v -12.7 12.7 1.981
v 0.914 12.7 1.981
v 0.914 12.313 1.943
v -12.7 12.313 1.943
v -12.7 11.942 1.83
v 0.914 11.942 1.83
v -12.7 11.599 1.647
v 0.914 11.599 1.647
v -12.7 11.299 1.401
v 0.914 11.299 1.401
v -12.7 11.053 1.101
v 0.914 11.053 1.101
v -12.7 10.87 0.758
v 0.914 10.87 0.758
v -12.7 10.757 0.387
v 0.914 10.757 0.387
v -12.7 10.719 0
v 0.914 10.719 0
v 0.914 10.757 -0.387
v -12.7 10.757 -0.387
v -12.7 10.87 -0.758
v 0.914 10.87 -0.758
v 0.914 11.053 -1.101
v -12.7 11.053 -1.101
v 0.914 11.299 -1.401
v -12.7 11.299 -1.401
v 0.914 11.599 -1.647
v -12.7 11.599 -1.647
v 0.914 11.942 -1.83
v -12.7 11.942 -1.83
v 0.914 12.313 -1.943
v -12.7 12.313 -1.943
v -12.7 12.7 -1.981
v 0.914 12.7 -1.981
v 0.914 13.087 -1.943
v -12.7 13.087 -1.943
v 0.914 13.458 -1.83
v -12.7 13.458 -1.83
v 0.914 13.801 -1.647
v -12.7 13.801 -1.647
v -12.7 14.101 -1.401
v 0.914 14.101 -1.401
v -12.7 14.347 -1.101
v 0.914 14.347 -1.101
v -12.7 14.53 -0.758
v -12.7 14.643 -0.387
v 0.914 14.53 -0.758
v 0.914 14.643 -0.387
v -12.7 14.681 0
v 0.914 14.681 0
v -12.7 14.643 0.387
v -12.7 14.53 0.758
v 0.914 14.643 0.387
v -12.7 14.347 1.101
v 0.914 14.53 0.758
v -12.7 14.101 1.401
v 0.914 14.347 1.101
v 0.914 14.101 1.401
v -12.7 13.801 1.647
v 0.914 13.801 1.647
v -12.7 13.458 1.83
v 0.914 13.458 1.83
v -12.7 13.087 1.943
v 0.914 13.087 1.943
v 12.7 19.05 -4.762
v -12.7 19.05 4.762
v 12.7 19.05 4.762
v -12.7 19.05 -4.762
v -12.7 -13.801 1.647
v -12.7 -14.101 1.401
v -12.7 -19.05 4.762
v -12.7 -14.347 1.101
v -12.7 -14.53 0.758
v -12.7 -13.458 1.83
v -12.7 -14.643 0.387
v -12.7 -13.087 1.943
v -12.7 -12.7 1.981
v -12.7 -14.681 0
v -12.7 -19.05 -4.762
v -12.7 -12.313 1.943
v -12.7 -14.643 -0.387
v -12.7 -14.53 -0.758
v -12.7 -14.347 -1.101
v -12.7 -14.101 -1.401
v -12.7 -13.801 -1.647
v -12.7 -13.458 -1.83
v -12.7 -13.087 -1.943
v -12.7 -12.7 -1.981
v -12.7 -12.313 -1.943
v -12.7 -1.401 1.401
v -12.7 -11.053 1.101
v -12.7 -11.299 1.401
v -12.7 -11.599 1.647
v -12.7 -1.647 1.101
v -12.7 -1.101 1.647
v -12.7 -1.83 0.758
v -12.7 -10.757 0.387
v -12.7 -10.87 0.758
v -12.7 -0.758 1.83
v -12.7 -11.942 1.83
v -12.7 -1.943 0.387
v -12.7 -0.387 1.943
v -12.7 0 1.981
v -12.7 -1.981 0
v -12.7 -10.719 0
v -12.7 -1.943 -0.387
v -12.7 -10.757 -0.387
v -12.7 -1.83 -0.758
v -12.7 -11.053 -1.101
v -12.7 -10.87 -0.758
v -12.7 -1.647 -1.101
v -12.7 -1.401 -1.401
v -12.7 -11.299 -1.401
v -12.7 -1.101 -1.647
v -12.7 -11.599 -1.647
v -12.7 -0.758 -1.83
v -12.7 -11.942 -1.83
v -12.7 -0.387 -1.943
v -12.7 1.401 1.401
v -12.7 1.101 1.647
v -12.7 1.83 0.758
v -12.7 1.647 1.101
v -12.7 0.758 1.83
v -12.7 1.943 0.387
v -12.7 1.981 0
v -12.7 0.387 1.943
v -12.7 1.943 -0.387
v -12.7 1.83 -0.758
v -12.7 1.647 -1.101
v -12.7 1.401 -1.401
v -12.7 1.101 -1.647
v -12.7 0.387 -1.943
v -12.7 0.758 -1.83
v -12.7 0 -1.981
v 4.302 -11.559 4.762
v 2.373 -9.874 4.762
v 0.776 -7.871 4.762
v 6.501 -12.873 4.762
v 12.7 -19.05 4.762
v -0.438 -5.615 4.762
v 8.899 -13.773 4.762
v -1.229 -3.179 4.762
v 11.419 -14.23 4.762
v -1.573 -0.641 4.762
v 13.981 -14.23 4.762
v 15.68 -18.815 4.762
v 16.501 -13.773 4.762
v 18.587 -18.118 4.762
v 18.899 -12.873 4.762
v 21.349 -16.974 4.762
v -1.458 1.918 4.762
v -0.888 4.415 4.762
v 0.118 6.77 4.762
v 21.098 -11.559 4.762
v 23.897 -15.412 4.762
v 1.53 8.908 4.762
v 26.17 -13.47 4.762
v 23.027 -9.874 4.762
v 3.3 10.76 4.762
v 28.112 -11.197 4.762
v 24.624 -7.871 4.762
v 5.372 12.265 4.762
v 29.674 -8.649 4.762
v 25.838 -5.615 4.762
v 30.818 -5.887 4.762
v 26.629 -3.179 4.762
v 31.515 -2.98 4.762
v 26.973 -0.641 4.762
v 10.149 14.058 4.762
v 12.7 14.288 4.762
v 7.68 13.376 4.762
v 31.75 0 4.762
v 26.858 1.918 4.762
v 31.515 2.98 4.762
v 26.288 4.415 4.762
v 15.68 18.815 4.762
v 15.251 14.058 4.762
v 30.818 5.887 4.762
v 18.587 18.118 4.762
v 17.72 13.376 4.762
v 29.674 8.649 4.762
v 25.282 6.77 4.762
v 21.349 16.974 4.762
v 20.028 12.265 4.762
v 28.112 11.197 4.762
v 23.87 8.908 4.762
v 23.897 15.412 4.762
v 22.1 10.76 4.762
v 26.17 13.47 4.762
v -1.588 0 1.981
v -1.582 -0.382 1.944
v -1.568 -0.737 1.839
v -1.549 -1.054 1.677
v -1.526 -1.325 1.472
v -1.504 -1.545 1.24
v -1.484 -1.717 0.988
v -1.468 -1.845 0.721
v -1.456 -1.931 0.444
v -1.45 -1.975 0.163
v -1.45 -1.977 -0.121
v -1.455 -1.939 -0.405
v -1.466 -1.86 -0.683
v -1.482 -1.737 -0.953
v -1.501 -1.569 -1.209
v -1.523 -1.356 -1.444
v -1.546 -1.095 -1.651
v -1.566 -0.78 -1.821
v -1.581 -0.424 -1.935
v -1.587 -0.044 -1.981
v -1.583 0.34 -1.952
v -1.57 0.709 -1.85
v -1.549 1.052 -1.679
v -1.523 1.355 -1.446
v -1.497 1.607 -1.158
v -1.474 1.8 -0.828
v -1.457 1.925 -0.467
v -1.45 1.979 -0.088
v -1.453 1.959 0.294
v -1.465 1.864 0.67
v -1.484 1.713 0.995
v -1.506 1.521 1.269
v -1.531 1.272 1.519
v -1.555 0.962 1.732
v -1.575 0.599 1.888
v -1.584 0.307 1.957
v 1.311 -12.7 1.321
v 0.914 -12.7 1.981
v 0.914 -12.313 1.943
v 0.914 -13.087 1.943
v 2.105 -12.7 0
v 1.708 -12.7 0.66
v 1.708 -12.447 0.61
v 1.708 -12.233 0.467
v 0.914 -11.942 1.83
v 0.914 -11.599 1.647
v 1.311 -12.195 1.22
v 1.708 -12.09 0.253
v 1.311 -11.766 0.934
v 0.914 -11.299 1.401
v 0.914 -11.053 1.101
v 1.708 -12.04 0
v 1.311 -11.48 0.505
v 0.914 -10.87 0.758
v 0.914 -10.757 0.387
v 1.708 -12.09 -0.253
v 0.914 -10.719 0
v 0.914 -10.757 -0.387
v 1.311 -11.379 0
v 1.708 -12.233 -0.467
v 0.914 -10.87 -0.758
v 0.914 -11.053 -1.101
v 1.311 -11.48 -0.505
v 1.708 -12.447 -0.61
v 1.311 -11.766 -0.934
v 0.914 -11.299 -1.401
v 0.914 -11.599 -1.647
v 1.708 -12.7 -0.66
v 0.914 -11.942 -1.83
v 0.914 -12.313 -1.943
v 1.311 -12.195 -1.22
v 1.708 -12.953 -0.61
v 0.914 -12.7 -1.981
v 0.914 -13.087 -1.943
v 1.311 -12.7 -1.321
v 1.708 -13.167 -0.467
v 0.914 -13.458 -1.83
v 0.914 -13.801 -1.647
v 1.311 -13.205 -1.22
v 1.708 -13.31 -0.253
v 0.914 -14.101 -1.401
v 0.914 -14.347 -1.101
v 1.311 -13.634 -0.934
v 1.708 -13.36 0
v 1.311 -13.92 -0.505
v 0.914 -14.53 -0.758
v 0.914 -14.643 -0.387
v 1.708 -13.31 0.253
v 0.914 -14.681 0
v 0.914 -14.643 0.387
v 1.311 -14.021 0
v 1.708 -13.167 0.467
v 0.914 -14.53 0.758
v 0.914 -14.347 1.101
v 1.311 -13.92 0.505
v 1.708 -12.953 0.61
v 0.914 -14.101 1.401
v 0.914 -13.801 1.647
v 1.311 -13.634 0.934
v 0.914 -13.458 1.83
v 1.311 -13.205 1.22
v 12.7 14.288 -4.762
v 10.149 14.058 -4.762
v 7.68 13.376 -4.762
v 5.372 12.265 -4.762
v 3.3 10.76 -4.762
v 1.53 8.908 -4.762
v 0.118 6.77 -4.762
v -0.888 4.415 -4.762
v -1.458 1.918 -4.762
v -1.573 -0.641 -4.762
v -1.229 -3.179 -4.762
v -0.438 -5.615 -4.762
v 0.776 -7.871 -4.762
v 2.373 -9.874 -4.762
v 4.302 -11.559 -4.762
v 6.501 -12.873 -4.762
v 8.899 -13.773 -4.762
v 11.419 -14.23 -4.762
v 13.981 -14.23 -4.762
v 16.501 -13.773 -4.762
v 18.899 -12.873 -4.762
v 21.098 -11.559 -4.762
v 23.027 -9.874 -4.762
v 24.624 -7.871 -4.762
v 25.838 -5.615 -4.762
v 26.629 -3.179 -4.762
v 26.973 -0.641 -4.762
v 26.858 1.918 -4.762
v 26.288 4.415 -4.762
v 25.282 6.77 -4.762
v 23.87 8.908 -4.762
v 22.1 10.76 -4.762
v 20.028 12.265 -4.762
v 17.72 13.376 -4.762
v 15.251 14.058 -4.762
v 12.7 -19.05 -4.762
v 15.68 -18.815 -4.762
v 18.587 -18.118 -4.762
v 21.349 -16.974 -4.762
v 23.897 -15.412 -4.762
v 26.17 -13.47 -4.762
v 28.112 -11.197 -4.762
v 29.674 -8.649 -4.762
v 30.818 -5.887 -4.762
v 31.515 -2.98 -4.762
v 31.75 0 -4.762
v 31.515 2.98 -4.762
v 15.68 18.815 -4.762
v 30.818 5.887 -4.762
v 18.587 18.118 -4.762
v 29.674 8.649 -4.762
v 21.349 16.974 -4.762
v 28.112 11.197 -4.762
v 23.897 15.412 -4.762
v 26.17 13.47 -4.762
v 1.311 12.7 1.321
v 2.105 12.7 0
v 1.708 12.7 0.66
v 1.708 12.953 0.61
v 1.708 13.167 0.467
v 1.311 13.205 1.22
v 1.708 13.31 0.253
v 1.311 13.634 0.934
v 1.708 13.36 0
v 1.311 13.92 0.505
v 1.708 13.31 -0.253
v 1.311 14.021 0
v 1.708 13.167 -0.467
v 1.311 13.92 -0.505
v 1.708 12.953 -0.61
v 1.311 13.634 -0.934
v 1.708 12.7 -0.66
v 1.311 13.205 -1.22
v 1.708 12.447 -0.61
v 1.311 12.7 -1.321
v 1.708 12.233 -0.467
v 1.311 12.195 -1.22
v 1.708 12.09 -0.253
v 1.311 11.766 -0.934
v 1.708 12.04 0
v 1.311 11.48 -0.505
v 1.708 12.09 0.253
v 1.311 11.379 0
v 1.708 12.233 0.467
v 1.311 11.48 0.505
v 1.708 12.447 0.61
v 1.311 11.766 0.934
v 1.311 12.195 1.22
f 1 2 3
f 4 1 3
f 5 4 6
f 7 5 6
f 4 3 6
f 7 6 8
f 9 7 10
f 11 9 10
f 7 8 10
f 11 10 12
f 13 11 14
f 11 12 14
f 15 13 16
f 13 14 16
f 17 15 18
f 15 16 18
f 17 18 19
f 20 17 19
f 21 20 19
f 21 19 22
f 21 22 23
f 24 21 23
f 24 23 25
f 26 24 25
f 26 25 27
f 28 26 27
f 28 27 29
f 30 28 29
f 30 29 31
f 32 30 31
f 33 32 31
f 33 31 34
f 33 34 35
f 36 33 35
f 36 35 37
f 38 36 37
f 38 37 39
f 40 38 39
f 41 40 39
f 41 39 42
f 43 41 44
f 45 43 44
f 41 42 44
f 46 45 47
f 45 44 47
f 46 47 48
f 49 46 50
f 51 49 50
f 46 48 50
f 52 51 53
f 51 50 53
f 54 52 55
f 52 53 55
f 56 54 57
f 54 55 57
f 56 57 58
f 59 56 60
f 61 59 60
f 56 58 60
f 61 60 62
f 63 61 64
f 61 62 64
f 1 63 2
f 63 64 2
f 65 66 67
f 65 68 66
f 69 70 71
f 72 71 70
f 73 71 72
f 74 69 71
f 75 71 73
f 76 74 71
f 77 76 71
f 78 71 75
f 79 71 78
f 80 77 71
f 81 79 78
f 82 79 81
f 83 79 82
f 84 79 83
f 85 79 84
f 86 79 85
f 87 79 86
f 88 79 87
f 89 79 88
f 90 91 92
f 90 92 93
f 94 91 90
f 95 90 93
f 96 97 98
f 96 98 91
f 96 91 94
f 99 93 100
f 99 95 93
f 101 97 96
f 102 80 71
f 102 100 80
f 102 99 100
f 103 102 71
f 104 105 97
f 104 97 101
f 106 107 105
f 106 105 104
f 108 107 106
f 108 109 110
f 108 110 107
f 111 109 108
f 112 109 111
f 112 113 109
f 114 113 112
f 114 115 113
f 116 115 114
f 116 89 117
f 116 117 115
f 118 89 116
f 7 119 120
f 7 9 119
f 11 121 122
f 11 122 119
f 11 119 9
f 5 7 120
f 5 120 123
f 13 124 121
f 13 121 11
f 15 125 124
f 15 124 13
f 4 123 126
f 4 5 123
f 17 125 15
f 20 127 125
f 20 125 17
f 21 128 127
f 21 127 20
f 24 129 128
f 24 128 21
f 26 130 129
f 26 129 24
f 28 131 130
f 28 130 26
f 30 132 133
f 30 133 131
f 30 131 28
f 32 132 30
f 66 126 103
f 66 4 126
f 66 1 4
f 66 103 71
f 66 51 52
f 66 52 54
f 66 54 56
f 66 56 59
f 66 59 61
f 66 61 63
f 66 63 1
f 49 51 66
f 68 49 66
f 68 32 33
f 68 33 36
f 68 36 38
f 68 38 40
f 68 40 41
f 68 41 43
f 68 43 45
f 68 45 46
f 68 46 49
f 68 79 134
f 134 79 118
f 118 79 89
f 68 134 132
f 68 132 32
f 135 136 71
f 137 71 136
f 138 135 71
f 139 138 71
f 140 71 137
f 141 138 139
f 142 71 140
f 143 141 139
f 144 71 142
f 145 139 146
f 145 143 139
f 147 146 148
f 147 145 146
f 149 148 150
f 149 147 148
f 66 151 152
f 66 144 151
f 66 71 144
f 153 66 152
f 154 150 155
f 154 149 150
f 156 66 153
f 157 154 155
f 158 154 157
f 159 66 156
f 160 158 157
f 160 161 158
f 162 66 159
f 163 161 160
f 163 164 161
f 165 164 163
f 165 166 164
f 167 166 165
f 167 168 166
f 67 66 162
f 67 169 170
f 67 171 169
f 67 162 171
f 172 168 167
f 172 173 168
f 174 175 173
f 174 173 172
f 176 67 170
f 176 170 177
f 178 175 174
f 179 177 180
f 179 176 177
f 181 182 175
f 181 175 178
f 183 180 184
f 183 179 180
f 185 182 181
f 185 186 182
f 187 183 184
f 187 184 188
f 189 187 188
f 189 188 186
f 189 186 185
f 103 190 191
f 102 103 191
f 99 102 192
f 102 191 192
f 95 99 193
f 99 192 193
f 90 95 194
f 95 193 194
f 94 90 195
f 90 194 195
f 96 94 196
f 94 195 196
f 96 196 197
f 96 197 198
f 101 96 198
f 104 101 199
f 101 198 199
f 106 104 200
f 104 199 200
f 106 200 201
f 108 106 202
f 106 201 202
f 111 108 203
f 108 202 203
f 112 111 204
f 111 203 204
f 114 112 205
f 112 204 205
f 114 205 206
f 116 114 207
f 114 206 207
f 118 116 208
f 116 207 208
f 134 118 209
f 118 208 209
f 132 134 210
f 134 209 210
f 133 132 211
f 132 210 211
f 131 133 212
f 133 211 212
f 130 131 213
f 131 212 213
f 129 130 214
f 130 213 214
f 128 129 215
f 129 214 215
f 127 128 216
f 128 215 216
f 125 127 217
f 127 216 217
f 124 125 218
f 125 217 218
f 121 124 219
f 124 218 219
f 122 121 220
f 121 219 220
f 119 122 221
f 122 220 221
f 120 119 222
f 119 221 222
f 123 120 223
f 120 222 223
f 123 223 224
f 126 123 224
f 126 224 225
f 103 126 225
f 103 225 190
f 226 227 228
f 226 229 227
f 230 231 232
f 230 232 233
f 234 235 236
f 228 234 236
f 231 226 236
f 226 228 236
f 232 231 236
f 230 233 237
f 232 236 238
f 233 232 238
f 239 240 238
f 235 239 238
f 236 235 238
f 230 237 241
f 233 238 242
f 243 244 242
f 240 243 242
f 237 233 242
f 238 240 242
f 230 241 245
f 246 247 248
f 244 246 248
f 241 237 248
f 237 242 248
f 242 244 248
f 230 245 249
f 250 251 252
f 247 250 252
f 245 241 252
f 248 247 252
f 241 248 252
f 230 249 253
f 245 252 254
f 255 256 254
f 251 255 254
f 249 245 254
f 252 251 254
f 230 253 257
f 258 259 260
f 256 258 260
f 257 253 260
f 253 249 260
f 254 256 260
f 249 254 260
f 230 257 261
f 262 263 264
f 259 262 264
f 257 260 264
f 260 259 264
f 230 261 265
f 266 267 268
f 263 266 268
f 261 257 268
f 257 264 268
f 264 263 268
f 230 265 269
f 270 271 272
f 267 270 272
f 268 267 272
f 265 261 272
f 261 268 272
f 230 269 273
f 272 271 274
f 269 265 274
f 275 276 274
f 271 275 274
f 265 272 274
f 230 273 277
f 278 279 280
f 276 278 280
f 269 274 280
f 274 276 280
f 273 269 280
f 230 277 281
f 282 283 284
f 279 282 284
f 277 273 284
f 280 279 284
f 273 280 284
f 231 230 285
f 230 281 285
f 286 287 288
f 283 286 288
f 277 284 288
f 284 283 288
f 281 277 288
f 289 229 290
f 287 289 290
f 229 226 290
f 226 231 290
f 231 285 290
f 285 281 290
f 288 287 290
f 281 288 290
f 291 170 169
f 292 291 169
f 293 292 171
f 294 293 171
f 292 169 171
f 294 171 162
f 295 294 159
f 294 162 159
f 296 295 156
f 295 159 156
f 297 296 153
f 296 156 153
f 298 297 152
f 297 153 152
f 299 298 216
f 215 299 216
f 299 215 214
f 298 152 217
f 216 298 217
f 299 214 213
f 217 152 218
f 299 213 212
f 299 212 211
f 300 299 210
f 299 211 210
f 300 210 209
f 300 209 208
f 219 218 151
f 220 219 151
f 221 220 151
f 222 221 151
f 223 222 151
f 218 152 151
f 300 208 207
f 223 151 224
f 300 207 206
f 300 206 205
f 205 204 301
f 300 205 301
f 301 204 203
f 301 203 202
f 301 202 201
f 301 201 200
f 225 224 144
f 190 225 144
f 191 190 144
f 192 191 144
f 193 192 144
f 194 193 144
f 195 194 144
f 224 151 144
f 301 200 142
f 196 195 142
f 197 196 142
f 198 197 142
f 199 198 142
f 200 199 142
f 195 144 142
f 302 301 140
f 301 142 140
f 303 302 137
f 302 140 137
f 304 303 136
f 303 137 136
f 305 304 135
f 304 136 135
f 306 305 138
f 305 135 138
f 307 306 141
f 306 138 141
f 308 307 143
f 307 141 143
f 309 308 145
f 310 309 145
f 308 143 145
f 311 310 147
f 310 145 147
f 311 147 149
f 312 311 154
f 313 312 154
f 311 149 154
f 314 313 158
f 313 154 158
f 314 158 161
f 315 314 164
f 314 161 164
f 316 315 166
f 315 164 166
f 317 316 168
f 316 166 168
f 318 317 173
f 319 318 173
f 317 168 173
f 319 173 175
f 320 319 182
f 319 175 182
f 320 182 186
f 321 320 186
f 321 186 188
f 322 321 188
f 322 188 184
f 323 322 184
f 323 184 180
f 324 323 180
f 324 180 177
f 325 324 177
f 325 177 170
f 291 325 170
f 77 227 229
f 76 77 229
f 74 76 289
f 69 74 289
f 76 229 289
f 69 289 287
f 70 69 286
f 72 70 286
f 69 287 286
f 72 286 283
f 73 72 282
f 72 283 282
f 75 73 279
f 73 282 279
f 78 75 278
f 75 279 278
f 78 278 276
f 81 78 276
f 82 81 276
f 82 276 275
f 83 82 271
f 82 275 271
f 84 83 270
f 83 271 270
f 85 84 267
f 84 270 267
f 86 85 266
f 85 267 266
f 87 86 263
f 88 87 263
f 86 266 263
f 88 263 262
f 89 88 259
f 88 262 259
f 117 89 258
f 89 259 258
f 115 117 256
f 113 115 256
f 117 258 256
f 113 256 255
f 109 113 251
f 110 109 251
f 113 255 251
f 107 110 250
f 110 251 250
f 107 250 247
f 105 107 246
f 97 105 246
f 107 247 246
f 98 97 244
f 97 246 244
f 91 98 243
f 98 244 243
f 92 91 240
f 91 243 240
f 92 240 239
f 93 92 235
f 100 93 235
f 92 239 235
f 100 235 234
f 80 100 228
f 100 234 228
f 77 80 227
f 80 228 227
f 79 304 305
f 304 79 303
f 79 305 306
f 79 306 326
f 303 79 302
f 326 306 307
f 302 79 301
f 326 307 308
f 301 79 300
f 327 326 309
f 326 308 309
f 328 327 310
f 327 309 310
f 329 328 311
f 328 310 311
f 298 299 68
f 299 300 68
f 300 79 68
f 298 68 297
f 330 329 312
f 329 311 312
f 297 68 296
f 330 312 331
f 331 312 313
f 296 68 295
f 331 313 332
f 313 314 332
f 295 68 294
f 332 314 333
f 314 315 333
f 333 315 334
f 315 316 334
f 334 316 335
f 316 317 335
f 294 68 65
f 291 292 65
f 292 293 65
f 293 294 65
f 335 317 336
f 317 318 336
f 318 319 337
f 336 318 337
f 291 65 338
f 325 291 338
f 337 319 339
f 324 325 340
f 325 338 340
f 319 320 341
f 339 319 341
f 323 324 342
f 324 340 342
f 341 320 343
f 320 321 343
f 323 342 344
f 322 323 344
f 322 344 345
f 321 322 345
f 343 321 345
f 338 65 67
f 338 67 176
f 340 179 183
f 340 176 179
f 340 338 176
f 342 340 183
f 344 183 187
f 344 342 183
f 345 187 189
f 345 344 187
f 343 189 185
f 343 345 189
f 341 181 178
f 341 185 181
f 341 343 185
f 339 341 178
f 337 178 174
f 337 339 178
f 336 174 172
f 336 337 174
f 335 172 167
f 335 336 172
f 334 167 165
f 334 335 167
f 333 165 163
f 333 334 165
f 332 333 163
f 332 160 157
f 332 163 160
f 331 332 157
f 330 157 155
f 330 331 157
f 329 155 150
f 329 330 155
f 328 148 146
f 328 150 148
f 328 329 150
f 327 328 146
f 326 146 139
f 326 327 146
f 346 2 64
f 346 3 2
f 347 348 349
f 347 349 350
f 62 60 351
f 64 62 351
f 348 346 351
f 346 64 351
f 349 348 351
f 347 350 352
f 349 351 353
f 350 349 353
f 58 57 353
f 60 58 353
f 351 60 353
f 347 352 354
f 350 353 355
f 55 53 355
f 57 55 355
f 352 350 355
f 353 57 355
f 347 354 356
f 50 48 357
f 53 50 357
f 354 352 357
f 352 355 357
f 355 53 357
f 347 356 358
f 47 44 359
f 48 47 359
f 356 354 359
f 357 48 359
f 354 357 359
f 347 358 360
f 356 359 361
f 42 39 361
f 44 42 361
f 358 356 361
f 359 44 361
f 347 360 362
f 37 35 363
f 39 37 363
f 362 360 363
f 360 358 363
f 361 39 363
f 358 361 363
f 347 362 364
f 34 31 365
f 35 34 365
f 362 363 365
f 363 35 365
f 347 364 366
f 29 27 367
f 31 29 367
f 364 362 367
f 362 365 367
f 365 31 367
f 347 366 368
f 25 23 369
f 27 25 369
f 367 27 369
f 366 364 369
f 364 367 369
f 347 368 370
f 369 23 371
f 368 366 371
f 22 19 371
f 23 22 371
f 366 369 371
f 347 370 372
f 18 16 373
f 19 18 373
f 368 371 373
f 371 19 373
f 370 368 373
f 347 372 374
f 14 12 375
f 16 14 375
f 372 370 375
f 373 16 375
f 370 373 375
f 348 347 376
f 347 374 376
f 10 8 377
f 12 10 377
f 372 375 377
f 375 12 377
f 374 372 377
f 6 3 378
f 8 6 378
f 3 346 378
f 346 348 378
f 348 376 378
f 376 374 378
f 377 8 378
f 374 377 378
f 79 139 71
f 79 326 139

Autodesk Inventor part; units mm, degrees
ref_plane "YZ Plane" through (0, 0, 0) normal (1, 0, 0) x (0, 1, 0)
ref_plane "XZ Plane" through (0, 0, 0) normal (0, 1, 0) x (-1, 0, 0)
ref_plane "XY Plane" through (0, 0, 0) normal (0, 0, 1) x (1, 0, 0)
sketch "Sketch2" plane through (0, 0, 0) normal (0, 0, 1) x (1, 0, 0)
  line L0 (-12.7, 19.05) -> (12.7, 19.05)
  line L1 (12.7, 19.05) -> (12.7, -19.05) construction
  line L2 (12.7, -19.05) -> (-12.7, -19.05)
  line L3 (-12.7, -19.05) -> (-12.7, 19.05)
  line L4 (-12.7, 19.05) -> (12.7, -19.05) construction
  line L5 (12.7, 19.05) -> (-12.7, -19.05) construction
  arc A0 (12.7, -19.05) -> (12.7, 19.05) centre (12.7, 0) ccw
  point P0 (0, 0)
  point P1 (31.75, 0)
  dimension "d0" = 38.1
  dimension "d1" = 25.4
  dimension "d4" = 44.45
extrude "Extrusion1" add sketch "Sketch2" along normal mid plane 9.525
sketch "Sketch3" plane through (0, 0, -4.7625) normal (0, 0, -1) x (-1, 0, 0)
  arc A0 (-12.7, 19.05) -> (-12.7, -19.05) centre (-12.7, 0) ccw construction
  point P0 (0, 0)
hole "Hole1" at (12.7, 0, -4.7625) direction (0, 0, 1) diameter 28.575 end through all
sketch "Sketch4" plane through (-12.7, -19.05, 4.7625) normal (-1, 0, 0) x (0, 0, 1)
  line L0 (-4.7625, 6.35) -> (-4.7625, 31.75) construction
  point P0 (-4.7625, 19.05)
  point P1 (-4.7625, 19.05)
  dimension "d12" = 25.4
hole "Hole2" at (-12.7, -12.7, 0) at (-12.7, 12.7, 0) at (-12.7, 0, 0) direction (1, 0, 0) diameter 3.9624 depth 13.6144 tip angle 118 thread size "10-32 UNF" class "2B" standard "ANSI Unified Screw Threads"
properties part number "PLATE,BEARING,DRIVE,ELEVATOR" material "Aluminum, 7075-T6"
